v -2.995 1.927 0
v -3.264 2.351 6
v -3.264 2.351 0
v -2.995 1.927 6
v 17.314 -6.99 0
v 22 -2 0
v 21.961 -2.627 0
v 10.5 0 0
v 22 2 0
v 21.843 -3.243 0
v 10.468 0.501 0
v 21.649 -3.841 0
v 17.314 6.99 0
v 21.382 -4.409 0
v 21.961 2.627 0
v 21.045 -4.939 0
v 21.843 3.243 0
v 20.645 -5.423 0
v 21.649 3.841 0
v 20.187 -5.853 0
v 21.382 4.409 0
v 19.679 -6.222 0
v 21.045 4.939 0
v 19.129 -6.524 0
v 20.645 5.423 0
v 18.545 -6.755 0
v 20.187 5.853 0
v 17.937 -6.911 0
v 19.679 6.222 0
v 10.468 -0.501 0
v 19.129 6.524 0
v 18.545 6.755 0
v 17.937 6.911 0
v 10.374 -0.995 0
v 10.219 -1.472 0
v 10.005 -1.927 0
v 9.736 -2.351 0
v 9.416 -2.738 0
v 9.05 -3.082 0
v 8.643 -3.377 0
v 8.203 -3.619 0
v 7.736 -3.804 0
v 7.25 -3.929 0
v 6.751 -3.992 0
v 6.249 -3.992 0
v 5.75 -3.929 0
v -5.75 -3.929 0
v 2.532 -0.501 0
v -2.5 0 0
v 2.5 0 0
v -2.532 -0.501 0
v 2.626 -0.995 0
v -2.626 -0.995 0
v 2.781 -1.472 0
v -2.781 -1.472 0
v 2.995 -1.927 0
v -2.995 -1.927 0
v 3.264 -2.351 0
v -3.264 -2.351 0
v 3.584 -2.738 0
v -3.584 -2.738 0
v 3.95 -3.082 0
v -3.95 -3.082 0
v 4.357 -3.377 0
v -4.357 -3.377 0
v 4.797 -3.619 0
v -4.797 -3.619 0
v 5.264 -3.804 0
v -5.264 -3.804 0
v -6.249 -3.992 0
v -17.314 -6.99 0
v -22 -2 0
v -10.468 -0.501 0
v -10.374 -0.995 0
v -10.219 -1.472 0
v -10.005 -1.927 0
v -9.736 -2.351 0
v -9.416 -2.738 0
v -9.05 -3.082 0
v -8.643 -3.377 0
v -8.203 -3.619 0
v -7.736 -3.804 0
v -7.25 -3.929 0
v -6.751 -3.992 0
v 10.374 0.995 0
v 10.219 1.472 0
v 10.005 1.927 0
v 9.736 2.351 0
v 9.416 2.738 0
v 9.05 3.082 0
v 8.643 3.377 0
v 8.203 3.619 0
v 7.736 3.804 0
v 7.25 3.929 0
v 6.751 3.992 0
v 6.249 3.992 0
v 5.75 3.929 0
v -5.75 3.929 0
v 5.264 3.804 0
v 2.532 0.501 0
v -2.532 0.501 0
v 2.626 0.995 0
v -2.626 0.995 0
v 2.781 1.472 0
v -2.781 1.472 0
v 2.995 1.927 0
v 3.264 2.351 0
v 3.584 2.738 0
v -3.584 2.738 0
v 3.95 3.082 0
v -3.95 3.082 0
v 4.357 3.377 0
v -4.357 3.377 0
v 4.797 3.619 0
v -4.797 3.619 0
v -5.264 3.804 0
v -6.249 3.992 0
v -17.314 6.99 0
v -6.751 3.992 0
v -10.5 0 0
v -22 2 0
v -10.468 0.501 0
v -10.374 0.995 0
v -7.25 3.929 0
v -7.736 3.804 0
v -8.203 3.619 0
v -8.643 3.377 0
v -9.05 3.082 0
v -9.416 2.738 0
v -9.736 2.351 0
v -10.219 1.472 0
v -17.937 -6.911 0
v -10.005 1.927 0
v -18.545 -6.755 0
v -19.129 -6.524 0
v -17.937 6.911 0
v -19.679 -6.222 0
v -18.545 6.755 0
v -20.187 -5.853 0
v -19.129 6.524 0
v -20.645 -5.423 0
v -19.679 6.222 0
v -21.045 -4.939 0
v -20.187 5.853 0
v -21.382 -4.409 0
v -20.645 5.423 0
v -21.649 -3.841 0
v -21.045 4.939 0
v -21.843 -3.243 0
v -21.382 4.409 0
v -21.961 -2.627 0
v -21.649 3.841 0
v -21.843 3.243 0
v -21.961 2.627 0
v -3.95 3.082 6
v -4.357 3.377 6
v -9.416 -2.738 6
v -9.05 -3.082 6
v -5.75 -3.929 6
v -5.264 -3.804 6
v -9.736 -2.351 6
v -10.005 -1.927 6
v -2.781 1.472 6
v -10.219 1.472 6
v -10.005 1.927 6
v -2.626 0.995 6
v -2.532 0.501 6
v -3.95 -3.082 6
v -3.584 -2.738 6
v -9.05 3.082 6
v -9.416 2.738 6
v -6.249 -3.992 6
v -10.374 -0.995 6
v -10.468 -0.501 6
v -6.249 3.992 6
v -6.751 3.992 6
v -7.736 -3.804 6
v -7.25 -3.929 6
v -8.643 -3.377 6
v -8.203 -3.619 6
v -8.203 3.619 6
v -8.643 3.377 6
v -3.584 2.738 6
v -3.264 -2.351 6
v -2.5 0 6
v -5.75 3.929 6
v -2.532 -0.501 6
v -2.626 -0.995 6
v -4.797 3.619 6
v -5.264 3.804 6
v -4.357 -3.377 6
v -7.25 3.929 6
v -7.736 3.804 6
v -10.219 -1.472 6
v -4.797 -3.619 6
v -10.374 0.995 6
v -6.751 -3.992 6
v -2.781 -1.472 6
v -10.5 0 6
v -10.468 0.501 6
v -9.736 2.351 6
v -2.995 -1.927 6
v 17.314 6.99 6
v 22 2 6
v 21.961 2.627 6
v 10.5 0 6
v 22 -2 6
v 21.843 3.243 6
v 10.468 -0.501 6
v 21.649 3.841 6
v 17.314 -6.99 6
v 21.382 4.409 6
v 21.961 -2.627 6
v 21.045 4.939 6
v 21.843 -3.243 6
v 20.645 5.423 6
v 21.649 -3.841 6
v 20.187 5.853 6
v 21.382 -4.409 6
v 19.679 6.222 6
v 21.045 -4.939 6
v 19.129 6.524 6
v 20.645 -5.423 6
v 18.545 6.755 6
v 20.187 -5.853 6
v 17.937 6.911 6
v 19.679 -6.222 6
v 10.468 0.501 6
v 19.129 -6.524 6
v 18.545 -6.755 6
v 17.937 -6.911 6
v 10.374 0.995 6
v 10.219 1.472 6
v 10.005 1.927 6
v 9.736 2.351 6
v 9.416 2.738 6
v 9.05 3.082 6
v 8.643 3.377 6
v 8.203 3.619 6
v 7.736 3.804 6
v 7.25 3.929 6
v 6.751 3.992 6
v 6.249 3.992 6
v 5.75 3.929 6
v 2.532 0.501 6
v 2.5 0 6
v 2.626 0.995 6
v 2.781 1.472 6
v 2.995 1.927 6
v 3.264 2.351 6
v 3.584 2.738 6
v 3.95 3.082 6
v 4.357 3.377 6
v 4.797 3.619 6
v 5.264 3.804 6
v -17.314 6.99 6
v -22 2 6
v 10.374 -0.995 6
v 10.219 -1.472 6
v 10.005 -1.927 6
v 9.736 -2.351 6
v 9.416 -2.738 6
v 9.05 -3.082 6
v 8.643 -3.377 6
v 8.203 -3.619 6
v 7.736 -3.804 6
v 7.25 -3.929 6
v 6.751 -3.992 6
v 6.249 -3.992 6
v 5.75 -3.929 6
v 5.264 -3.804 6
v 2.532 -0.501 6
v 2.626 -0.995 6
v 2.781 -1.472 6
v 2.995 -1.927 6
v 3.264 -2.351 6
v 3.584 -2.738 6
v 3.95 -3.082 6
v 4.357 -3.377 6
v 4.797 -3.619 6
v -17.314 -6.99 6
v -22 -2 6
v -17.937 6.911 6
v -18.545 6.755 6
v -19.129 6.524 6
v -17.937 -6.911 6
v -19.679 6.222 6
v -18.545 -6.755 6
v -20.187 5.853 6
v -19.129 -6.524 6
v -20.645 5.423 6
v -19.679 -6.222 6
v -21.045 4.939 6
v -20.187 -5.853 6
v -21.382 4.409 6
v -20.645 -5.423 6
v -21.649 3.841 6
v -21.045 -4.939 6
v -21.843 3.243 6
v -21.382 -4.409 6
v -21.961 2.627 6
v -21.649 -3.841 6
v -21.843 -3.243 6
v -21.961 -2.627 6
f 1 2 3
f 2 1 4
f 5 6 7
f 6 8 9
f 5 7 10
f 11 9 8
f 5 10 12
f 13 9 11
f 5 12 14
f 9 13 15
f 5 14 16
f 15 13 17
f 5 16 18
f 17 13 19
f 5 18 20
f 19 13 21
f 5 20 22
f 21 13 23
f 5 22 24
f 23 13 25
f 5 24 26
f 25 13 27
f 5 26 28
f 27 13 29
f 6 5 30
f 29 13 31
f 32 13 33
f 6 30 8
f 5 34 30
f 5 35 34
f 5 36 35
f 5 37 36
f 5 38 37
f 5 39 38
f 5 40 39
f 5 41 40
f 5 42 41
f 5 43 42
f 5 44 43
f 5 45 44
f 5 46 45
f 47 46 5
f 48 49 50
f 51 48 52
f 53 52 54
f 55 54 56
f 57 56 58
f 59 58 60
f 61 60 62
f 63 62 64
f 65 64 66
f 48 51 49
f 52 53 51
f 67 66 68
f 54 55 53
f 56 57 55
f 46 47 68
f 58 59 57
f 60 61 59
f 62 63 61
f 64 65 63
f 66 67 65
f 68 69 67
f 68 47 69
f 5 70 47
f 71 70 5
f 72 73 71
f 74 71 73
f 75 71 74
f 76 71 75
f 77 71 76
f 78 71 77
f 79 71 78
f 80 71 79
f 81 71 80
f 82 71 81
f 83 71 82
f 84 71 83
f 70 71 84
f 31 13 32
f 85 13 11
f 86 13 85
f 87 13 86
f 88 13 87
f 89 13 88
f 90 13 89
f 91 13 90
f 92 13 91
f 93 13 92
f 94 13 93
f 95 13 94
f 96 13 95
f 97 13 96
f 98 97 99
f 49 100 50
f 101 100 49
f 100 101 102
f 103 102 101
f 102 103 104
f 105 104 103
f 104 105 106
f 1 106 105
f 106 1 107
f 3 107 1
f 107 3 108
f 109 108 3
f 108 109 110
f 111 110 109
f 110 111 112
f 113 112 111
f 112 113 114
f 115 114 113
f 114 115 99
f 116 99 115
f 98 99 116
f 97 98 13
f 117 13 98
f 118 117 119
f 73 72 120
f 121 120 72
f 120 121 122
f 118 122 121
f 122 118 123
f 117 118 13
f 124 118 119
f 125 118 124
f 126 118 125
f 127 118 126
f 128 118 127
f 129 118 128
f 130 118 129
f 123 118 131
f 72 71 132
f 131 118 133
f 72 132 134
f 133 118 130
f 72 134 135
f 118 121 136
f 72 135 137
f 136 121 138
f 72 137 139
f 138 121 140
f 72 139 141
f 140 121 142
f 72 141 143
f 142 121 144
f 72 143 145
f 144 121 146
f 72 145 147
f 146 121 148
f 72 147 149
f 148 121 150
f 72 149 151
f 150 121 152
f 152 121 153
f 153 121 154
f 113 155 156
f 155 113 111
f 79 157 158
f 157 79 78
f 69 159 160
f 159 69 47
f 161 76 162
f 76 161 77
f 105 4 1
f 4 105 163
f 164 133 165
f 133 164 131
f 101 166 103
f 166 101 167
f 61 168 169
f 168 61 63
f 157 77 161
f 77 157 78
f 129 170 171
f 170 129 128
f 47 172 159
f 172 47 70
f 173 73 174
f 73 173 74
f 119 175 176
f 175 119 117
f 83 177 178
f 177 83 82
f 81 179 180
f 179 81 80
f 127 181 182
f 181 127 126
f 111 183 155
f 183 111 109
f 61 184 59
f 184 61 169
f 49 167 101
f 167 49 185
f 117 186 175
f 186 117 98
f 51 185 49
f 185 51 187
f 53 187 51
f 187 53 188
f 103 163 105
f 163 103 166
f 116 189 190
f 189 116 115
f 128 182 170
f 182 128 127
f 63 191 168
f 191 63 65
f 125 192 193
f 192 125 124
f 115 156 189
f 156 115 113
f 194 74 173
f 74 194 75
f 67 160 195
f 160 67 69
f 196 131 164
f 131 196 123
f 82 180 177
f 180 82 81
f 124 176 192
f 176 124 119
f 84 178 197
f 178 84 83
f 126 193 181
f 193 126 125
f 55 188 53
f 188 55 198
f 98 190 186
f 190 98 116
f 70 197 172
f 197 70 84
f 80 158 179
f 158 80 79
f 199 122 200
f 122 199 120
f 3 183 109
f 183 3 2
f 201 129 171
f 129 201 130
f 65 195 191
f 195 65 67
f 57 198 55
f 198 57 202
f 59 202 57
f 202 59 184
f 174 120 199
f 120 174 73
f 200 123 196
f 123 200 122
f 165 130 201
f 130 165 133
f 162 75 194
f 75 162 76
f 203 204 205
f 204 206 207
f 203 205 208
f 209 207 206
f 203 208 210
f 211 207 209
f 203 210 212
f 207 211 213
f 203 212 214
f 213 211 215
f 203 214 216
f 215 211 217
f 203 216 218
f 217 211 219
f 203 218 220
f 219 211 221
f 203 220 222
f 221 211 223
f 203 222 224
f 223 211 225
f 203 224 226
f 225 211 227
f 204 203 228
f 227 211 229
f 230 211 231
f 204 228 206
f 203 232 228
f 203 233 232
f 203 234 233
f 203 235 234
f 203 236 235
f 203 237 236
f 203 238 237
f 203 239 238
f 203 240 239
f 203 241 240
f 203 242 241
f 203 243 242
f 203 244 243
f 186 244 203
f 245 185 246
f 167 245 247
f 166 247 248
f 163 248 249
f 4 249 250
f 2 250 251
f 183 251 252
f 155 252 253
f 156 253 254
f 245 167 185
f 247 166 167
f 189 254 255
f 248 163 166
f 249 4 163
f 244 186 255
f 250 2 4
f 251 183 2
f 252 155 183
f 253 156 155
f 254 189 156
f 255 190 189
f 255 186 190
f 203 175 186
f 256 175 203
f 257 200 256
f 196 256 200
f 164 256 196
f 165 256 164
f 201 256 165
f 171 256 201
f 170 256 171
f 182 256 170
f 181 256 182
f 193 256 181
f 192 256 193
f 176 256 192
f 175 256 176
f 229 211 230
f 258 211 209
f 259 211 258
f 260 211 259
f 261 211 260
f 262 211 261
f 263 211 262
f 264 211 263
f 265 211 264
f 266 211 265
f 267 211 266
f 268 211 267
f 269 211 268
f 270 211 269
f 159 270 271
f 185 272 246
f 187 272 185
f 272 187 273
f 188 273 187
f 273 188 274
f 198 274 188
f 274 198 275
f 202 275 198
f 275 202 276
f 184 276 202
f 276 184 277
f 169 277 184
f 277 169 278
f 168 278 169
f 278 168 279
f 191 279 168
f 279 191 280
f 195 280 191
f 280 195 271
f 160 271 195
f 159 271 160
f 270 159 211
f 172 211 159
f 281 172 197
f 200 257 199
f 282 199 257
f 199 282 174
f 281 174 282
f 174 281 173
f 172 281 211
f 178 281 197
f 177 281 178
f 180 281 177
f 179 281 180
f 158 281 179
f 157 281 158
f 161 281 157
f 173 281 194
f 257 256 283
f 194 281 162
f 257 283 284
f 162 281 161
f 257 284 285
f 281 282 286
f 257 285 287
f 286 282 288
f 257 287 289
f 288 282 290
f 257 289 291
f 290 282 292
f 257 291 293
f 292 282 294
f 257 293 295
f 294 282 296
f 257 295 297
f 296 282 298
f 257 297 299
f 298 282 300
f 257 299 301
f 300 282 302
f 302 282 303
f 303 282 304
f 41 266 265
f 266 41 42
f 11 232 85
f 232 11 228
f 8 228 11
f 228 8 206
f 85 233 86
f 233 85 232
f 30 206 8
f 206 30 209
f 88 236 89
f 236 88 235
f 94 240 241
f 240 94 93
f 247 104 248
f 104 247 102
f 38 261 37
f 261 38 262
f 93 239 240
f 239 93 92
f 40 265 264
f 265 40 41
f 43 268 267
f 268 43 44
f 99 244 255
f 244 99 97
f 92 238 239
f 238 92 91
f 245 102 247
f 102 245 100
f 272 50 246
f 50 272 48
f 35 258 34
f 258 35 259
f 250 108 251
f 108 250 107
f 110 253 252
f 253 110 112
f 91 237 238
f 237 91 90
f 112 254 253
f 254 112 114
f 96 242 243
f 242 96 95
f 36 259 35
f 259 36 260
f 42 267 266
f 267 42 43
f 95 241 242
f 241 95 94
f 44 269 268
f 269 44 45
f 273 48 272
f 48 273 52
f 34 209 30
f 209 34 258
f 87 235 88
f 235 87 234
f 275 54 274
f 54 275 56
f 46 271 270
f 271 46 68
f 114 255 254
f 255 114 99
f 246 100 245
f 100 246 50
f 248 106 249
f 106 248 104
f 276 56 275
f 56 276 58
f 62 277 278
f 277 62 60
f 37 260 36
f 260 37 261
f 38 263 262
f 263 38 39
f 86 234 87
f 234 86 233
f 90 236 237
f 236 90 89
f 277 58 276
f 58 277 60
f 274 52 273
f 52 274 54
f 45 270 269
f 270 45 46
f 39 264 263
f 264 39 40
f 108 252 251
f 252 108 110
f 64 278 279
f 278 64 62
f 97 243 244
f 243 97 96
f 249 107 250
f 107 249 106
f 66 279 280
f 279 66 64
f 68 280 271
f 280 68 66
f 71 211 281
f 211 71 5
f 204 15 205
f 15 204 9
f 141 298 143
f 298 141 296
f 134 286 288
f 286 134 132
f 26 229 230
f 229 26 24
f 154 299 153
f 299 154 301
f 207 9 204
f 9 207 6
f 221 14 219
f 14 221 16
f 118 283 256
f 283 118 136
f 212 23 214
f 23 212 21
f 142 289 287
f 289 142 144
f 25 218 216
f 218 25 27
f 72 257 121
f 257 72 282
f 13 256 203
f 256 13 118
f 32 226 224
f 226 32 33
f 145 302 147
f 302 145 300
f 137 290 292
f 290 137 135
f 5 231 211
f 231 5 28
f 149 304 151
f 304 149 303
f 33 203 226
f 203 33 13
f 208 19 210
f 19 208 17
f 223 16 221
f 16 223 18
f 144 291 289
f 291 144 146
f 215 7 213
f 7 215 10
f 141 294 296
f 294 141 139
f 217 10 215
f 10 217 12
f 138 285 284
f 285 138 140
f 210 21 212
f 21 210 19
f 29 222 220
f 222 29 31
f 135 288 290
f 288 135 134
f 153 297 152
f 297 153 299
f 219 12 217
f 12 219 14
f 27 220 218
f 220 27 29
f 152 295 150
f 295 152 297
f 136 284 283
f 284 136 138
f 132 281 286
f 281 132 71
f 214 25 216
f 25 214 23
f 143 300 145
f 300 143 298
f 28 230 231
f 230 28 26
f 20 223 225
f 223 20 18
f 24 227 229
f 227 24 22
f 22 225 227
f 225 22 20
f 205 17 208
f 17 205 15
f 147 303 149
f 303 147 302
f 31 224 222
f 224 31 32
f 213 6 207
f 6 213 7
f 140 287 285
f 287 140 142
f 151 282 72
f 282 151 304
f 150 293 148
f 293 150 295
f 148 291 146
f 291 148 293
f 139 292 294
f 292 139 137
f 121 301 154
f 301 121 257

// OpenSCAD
$fn = 50;

difference() {
	union() {
		hull() {
			translate(v = [-17.0, 2.0, 0]) {
				cylinder(h = 6, r = 5);
			}
			translate(v = [17.0, 2.0, 0]) {
				cylinder(h = 6, r = 5);
			}
			translate(v = [-17.0, -2.0, 0]) {
				cylinder(h = 6, r = 5);
			}
			translate(v = [17.0, -2.0, 0]) {
				cylinder(h = 6, r = 5);
			}
		}
	}
	union() {
		translate(v = [-6.5, 0, 0.0]) {
			cylinder(h = 6, r = 4.0);
		}
		translate(v = [6.5, 0, 0.0]) {
			cylinder(h = 6, r = 4.0);
		}
	}
}
